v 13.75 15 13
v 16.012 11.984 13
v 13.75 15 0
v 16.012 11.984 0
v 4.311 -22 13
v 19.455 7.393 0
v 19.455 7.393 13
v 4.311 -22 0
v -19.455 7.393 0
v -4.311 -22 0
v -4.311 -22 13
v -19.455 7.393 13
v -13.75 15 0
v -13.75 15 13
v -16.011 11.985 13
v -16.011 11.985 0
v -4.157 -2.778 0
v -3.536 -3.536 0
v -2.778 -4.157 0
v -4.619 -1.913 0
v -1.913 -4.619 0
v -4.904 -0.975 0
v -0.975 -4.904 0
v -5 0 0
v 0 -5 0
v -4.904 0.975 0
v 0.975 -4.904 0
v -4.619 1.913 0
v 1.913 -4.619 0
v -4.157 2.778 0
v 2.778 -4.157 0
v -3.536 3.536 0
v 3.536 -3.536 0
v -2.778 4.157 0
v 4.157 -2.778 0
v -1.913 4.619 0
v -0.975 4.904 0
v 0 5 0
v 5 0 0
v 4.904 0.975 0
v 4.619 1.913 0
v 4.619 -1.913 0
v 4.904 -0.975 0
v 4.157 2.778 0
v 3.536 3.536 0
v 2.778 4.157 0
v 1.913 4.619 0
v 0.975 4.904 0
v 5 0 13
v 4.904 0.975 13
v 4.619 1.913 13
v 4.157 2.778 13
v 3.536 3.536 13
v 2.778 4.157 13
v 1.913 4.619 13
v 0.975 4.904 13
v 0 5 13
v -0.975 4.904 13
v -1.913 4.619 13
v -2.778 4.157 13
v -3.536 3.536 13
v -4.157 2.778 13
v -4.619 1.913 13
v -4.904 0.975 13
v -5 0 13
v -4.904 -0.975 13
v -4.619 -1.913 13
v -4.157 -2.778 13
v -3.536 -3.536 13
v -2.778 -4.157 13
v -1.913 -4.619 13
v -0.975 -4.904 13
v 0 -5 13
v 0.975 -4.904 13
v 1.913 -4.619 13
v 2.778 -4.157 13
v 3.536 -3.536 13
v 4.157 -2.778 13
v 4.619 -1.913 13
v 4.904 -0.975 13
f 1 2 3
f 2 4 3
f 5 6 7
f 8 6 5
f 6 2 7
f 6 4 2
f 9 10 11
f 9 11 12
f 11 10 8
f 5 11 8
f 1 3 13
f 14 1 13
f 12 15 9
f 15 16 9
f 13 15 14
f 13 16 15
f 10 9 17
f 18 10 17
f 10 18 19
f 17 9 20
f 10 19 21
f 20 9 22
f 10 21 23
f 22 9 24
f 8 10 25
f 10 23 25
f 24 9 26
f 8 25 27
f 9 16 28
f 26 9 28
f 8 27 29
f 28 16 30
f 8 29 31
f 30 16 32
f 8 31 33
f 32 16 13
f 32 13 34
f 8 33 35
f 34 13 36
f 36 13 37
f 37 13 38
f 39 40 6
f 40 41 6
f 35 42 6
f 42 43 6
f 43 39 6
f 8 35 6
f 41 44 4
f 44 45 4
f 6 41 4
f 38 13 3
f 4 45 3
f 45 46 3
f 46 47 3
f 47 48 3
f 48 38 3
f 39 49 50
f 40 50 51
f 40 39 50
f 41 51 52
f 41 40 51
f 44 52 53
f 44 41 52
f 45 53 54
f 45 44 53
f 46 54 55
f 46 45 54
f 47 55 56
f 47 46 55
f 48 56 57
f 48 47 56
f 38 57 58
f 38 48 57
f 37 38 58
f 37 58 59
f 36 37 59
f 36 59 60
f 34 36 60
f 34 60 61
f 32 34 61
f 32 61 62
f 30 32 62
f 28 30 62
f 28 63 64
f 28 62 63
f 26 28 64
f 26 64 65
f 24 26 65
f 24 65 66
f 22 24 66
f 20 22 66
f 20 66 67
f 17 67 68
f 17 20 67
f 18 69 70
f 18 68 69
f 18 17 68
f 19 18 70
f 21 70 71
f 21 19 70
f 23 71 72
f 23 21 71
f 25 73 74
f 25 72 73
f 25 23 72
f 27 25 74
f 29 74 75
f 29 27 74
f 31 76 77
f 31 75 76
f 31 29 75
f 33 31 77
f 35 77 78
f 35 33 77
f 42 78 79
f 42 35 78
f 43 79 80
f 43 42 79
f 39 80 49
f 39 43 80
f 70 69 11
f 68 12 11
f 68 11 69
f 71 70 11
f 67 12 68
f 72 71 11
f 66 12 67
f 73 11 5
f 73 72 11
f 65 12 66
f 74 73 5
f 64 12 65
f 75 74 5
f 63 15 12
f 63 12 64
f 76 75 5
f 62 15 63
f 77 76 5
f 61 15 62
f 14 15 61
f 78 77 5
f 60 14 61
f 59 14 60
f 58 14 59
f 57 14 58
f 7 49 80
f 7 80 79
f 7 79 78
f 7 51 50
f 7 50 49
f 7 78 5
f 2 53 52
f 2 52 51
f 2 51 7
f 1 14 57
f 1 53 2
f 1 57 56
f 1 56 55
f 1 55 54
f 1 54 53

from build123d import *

# Parameters (mm, degrees)
SKETCH_R  = 5
PAD_DEPTH = 13


with BuildPart() as part:
    # Sketch → Pad (new body)
    with BuildSketch(Plane.XY):
        Polygon((-13.75, 15), (13.749989, 15), (19.455317, 7.392933), (4.310835, -22), (1.95122, -22), (-1.95122, -22), (-4.310835, -22), (-19.45531, 7.39292), align=None)
        Circle(SKETCH_R, mode=Mode.SUBTRACT)
    pad = extrude(amount=PAD_DEPTH)

    # Mirrored: Pad across Sketch V_Axis
    add(pad.mirror(Plane(origin=(0, 0, 0), x_dir=(0, 0, 1), z_dir=(1, 0, 0))))


solid = part.part
